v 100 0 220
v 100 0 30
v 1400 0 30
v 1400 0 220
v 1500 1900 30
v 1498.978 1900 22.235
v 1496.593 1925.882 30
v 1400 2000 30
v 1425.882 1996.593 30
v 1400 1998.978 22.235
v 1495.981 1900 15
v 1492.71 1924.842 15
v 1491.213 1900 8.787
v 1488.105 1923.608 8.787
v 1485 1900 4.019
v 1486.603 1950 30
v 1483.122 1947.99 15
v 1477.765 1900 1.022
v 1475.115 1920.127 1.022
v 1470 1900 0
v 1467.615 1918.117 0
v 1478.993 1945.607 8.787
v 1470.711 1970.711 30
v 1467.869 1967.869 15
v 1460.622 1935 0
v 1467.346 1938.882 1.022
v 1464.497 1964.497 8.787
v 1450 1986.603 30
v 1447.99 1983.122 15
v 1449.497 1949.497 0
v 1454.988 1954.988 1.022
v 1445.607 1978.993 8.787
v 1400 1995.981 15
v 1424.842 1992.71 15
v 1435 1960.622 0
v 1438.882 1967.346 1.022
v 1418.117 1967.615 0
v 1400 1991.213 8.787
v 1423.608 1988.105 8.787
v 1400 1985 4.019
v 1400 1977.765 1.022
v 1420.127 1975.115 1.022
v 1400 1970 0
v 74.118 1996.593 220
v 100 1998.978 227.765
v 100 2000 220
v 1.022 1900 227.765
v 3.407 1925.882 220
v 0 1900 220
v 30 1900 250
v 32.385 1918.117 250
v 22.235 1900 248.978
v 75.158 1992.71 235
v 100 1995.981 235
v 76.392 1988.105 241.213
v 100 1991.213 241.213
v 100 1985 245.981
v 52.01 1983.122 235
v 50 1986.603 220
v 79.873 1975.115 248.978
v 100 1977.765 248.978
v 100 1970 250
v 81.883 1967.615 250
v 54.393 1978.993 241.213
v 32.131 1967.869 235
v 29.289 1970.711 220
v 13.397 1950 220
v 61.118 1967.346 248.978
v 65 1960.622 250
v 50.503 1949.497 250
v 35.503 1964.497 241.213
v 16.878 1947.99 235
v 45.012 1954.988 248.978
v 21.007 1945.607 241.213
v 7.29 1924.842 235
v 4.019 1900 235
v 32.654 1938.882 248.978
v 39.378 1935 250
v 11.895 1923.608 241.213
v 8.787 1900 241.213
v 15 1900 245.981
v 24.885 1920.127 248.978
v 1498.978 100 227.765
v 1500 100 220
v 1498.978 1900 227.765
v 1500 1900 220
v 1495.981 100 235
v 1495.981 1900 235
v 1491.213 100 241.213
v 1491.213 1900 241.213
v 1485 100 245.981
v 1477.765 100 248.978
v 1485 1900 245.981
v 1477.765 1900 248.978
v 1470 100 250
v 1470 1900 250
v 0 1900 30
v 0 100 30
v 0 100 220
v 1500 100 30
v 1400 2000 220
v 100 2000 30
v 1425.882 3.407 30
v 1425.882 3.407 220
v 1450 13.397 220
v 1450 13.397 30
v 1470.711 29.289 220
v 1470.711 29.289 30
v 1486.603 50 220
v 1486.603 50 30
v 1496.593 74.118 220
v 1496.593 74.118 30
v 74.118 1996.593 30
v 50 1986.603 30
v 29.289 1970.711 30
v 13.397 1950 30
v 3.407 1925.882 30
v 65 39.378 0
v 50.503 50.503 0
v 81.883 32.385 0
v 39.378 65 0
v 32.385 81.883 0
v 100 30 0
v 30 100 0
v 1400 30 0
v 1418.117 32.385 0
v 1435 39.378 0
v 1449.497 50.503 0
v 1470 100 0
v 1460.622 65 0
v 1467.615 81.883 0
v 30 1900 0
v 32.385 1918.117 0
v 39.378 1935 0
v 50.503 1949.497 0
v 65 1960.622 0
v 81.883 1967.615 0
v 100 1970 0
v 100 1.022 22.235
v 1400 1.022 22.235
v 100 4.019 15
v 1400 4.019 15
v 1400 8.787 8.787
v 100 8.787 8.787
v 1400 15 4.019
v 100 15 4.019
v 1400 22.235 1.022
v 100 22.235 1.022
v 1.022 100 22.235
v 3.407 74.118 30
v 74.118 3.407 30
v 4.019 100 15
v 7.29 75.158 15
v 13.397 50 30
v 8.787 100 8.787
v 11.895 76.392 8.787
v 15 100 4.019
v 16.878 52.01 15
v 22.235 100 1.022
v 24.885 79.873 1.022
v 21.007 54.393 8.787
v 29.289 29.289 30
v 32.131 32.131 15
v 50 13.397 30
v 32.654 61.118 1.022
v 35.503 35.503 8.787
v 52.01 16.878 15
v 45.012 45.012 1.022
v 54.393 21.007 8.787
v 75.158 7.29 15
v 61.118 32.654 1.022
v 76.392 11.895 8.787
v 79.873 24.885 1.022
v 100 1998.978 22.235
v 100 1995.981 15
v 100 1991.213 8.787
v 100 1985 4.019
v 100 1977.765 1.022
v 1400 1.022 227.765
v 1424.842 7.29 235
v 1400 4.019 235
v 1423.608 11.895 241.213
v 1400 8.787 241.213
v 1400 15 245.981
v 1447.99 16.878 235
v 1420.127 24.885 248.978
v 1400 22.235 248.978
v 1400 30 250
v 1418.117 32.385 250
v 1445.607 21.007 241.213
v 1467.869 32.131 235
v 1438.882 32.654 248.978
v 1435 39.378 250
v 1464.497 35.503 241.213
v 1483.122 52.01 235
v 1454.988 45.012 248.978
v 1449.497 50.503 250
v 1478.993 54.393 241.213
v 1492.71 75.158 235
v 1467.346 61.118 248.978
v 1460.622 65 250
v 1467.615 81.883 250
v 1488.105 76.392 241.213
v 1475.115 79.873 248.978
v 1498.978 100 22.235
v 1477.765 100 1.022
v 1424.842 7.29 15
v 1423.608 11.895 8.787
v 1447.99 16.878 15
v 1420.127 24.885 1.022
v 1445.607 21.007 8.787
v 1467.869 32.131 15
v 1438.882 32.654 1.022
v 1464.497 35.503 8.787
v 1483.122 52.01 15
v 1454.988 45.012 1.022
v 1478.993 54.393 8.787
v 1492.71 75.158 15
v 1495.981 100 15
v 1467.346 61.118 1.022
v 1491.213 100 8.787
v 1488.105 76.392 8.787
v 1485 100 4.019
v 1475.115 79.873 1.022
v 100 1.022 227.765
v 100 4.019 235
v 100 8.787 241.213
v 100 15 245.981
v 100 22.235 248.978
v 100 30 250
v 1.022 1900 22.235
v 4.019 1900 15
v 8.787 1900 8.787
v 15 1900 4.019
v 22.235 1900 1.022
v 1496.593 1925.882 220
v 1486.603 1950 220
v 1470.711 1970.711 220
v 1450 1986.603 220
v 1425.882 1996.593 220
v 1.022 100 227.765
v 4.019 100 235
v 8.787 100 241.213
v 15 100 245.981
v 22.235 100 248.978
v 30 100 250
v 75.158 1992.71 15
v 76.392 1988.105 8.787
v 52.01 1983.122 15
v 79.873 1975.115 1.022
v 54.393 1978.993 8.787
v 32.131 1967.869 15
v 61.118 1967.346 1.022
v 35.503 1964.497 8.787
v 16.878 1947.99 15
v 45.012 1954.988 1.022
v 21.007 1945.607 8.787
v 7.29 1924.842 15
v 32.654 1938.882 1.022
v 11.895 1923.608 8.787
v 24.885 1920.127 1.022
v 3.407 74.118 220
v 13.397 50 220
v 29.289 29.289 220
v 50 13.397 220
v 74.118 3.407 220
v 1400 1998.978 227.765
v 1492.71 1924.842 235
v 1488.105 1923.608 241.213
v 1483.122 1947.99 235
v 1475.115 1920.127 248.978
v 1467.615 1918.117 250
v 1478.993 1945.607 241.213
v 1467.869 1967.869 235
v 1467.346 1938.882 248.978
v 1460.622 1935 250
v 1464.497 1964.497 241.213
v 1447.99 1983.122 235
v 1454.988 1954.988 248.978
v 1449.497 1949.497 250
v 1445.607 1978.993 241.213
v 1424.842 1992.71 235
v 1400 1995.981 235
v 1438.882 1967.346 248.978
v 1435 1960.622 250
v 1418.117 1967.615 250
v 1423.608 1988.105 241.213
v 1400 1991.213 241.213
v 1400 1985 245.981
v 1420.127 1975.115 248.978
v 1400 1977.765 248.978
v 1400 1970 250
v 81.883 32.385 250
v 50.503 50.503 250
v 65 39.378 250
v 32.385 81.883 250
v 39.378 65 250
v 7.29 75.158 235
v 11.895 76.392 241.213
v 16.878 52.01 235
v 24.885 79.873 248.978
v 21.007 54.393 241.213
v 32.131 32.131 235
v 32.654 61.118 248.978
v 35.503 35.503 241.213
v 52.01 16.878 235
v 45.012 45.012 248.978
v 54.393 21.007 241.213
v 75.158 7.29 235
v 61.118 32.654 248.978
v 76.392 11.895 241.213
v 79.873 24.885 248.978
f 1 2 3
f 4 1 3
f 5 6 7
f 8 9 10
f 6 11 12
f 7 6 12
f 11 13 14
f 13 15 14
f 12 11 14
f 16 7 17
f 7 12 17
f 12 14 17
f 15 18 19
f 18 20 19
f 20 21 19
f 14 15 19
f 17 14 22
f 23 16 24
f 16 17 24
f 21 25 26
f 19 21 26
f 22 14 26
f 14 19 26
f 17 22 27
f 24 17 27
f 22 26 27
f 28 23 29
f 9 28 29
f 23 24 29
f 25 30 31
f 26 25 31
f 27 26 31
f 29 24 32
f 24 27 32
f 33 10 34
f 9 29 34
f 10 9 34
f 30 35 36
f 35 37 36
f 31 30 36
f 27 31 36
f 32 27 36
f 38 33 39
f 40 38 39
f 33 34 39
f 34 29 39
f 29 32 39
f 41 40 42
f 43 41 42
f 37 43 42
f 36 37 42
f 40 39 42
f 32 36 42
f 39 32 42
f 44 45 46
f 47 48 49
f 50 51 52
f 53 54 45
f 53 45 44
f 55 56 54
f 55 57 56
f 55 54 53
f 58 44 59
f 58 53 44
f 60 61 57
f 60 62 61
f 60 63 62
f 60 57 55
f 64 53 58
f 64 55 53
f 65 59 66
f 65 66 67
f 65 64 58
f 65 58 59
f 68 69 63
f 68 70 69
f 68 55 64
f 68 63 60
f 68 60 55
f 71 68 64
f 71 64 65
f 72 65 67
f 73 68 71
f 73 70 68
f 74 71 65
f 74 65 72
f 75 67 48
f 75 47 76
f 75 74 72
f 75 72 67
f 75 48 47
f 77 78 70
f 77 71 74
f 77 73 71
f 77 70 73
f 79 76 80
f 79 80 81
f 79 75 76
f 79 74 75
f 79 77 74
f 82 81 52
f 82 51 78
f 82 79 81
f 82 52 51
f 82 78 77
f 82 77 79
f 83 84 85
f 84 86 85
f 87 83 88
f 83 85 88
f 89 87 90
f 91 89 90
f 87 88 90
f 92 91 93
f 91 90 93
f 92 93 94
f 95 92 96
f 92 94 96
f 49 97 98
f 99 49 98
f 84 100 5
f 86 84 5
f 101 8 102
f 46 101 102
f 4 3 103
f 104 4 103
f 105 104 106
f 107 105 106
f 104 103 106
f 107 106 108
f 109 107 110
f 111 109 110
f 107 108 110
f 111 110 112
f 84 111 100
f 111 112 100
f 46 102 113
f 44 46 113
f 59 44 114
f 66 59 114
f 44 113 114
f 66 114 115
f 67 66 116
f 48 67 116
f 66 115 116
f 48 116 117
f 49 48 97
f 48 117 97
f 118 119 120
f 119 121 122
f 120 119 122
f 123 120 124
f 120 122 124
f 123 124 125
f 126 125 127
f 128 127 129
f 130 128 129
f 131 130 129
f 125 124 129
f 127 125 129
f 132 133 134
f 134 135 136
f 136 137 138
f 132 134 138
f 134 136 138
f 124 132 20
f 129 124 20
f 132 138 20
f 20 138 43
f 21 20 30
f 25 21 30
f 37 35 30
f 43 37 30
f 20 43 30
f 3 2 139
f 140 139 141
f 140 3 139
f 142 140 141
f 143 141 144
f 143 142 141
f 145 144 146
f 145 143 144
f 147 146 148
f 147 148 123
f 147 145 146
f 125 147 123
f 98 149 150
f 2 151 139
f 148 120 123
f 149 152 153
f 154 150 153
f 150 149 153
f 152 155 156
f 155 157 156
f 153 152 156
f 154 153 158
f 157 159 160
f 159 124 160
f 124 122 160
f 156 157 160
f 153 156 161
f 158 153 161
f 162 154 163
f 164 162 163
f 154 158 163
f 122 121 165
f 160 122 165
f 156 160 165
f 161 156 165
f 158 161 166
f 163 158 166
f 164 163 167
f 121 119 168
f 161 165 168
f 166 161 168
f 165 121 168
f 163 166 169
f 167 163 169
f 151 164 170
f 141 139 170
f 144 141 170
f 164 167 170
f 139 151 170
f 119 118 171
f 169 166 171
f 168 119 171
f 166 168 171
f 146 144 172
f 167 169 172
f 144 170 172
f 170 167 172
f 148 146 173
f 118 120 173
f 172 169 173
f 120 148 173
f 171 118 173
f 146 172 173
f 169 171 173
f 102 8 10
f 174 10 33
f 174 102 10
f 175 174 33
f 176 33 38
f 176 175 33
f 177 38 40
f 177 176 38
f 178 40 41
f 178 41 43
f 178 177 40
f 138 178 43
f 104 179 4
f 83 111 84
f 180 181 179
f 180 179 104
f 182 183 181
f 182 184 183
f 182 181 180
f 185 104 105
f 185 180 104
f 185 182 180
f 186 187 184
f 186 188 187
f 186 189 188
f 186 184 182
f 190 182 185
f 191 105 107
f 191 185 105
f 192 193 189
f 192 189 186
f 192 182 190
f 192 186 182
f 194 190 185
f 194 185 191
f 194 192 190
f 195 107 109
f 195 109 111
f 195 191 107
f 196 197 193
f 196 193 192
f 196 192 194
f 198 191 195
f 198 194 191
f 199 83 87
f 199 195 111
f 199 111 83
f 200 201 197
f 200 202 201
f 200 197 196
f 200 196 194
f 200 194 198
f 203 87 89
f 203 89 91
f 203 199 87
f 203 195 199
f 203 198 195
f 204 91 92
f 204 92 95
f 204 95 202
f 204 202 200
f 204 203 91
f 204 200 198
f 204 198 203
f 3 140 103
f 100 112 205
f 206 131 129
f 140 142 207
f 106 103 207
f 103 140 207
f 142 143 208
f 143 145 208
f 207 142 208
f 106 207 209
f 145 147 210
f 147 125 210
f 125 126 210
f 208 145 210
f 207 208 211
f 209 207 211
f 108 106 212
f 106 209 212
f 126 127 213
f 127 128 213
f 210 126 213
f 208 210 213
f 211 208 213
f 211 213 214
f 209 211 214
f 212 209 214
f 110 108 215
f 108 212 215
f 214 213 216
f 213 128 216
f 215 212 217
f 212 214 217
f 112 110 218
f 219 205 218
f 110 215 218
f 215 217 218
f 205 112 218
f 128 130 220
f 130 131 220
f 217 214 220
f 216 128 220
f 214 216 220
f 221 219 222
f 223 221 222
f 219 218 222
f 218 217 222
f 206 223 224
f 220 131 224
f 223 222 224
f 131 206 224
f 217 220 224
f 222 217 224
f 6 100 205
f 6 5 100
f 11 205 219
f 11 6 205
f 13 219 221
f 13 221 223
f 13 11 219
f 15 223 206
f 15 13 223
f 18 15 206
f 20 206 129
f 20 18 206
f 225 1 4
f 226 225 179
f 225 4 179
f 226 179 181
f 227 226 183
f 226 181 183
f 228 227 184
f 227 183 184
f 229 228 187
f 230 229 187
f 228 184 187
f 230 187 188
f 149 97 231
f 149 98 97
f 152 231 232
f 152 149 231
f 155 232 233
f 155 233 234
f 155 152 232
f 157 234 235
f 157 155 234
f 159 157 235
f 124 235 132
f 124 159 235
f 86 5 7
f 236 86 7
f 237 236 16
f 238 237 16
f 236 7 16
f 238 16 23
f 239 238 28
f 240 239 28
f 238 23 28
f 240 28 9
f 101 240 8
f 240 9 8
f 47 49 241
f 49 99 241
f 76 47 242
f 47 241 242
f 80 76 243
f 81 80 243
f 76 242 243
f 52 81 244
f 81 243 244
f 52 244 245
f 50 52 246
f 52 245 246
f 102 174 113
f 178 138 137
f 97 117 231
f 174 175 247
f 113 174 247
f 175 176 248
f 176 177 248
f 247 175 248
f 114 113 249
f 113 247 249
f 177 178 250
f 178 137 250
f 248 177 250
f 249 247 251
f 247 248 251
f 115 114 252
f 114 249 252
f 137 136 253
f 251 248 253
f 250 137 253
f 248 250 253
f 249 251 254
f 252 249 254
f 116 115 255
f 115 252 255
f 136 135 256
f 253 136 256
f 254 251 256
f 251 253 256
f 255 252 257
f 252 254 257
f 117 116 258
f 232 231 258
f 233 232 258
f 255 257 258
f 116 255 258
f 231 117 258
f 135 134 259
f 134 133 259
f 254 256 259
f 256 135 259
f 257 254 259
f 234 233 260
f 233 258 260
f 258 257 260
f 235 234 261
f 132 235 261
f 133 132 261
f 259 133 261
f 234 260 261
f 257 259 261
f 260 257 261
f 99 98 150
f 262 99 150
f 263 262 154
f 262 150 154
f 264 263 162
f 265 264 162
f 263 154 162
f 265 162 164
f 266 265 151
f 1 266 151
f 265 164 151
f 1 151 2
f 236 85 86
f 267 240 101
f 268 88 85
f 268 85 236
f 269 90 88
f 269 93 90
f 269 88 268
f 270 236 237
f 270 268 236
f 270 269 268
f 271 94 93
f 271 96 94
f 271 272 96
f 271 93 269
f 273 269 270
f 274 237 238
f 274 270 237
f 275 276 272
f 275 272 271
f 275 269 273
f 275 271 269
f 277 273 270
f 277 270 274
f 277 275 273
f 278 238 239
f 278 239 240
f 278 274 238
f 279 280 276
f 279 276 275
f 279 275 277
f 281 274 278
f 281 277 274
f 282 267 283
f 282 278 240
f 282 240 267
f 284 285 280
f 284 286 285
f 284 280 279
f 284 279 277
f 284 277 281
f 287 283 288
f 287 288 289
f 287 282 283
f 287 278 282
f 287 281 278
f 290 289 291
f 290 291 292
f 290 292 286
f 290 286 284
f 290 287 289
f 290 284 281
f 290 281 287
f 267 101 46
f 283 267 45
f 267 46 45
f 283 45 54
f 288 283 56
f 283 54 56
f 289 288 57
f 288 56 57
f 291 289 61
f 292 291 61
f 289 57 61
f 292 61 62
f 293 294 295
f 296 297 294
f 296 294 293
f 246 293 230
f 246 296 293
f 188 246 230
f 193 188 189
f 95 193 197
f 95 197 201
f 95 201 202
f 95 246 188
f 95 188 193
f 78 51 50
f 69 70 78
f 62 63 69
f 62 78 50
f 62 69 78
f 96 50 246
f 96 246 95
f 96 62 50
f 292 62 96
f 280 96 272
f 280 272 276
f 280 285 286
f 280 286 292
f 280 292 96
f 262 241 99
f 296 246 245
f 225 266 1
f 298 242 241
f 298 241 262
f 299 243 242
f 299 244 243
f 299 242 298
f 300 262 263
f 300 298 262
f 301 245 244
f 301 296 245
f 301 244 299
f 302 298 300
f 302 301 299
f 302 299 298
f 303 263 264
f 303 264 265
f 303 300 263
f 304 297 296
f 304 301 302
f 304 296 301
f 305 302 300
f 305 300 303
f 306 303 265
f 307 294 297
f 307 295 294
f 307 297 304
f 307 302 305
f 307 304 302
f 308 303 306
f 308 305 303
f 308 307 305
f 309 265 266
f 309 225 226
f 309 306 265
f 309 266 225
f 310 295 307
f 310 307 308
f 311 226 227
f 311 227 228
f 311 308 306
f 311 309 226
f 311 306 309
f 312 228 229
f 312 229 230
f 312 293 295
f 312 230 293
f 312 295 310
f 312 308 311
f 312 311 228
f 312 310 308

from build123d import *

# Parameters (mm, degrees)
F1_DEPTH = 250
F2_R     = 30


with BuildPart() as f1:
    # F0 (on Top) → F1 (new body)
    with BuildSketch(Plane.XY):
        with BuildLine():
            ThreePointArc((0, 100), (29.289322, 29.289322), (100, 0))
            Line((100, 0), (1400, 0))
            ThreePointArc((1400, 0), (1470.710678, 29.289322), (1500, 100))
            Line((1500, 100), (1500, 1900))
            ThreePointArc((1500, 1900), (1470.710678, 1970.710678), (1400, 2000))
            Line((1400, 2000), (100, 2000))
            ThreePointArc((100, 2000), (29.289322, 1970.710678), (0, 1900))
            Line((0, 1900), (0, 100))
        make_face()
    extrude(amount=F1_DEPTH)

    # F2
    f2_edges = [f1.edges().sort_by_distance(p)[0] for p in [
        (0, 1000, 250),
        (29.289322, 29.289322, 250),
        (750, 0, 250),
        (1470.710678, 29.289322, 250),
        (1500, 1000, 250),
        (1470.710678, 1970.710678, 250),
        (750, 2000, 250),
        (29.289322, 1970.710678, 250),
        (0, 1000, 0),
        (29.289322, 29.289322, 0),
        (750, 0, 0),
        (1470.710678, 29.289322, 0),
        (1500, 1000, 0),
        (1470.710678, 1970.710678, 0),
        (750, 2000, 0),
        (29.289322, 1970.710678, 0),
    ]]
    fillet(f2_edges, radius=F2_R)


solid = f1.part
